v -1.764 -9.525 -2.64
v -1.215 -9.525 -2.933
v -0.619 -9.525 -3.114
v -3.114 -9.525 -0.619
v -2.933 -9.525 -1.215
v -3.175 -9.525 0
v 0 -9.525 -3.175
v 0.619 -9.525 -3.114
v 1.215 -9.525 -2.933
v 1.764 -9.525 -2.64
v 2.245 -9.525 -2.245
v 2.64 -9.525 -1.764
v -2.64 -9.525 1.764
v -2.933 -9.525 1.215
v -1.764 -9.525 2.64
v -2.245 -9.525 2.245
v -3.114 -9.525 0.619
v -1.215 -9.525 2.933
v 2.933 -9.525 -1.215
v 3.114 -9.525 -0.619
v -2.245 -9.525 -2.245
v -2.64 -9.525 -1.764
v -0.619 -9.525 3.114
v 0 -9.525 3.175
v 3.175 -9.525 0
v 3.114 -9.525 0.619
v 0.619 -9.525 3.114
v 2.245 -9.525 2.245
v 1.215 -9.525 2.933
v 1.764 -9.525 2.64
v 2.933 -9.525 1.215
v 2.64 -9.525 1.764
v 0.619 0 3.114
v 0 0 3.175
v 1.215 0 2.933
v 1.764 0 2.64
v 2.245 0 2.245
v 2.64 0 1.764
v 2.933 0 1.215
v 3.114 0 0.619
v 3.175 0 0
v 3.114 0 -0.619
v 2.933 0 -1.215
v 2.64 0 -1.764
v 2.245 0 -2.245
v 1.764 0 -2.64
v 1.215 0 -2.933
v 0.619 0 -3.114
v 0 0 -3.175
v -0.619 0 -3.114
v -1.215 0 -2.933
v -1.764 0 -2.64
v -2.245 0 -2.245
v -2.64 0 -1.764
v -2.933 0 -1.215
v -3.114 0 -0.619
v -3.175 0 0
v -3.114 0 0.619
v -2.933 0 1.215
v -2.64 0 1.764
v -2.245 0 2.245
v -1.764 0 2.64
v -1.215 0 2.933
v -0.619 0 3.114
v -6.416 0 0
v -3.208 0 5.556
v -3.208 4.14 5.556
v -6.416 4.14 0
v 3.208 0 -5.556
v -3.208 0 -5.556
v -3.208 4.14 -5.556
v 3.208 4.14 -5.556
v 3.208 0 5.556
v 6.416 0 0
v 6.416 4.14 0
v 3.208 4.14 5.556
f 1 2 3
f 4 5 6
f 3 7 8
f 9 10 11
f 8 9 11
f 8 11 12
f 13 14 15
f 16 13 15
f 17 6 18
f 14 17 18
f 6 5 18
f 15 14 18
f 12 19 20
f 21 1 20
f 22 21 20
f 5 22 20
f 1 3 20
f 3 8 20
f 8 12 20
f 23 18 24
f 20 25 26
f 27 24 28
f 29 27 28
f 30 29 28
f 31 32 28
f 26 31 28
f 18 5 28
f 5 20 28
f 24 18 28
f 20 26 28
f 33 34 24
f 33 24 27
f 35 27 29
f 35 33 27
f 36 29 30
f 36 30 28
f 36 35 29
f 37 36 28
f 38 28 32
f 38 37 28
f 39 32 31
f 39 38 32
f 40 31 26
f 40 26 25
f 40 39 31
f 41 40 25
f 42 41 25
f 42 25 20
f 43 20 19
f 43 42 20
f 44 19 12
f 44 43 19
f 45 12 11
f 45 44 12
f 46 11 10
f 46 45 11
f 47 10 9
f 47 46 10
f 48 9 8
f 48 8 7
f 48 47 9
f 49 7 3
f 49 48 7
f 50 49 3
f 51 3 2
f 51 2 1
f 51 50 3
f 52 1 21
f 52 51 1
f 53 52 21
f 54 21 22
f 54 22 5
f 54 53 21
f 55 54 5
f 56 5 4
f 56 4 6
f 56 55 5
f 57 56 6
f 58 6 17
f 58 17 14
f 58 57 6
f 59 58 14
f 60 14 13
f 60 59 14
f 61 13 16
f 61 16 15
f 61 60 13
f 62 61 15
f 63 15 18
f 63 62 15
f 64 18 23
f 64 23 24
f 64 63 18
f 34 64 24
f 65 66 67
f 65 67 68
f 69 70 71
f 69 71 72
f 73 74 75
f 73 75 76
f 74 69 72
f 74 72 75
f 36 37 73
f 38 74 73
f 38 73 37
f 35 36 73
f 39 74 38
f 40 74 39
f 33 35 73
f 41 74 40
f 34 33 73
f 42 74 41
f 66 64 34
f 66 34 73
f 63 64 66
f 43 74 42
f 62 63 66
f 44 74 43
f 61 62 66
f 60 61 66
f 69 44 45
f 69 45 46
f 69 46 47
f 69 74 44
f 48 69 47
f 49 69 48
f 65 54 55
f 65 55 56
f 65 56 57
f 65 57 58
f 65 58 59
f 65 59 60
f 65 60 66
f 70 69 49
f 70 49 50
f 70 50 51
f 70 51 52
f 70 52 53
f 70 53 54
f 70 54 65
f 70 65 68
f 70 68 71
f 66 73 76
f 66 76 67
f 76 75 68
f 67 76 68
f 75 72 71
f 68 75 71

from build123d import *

# Parameters (mm, degrees)
SKETCH1_R           = 3.175
BOSS_EXTRUDE1_DEPTH = 9.525
BOSS_EXTRUDE2_DEPTH = 4.1402


with BuildPart() as part:
    # Sketch1 → Boss-Extrude1 (new body)
    with BuildSketch(Plane(origin=(0, 0, 0), x_dir=(1, 0, 0), z_dir=(0, 1, 0))):
        with Locations(Location((0, 0, 0), (0, 0, 270))):  # turned: the seam where the file's is
            Circle(SKETCH1_R)
    extrude(amount=-BOSS_EXTRUDE1_DEPTH)

    # Sketch2 → Boss-Extrude2 (add)
    with BuildSketch(Plane(origin=(0, 0, 0), x_dir=(1, 0, 0), z_dir=(0, 1, 0))):
        Polygon((-3.207902433, 5.55625), (3.207902433, 5.55625), (6.415804866, 0), (3.207902433, -5.55625), (-3.207902433, -5.55625), (-6.415804866, 0), align=None)
    extrude(amount=BOSS_EXTRUDE2_DEPTH)


solid = part.part
